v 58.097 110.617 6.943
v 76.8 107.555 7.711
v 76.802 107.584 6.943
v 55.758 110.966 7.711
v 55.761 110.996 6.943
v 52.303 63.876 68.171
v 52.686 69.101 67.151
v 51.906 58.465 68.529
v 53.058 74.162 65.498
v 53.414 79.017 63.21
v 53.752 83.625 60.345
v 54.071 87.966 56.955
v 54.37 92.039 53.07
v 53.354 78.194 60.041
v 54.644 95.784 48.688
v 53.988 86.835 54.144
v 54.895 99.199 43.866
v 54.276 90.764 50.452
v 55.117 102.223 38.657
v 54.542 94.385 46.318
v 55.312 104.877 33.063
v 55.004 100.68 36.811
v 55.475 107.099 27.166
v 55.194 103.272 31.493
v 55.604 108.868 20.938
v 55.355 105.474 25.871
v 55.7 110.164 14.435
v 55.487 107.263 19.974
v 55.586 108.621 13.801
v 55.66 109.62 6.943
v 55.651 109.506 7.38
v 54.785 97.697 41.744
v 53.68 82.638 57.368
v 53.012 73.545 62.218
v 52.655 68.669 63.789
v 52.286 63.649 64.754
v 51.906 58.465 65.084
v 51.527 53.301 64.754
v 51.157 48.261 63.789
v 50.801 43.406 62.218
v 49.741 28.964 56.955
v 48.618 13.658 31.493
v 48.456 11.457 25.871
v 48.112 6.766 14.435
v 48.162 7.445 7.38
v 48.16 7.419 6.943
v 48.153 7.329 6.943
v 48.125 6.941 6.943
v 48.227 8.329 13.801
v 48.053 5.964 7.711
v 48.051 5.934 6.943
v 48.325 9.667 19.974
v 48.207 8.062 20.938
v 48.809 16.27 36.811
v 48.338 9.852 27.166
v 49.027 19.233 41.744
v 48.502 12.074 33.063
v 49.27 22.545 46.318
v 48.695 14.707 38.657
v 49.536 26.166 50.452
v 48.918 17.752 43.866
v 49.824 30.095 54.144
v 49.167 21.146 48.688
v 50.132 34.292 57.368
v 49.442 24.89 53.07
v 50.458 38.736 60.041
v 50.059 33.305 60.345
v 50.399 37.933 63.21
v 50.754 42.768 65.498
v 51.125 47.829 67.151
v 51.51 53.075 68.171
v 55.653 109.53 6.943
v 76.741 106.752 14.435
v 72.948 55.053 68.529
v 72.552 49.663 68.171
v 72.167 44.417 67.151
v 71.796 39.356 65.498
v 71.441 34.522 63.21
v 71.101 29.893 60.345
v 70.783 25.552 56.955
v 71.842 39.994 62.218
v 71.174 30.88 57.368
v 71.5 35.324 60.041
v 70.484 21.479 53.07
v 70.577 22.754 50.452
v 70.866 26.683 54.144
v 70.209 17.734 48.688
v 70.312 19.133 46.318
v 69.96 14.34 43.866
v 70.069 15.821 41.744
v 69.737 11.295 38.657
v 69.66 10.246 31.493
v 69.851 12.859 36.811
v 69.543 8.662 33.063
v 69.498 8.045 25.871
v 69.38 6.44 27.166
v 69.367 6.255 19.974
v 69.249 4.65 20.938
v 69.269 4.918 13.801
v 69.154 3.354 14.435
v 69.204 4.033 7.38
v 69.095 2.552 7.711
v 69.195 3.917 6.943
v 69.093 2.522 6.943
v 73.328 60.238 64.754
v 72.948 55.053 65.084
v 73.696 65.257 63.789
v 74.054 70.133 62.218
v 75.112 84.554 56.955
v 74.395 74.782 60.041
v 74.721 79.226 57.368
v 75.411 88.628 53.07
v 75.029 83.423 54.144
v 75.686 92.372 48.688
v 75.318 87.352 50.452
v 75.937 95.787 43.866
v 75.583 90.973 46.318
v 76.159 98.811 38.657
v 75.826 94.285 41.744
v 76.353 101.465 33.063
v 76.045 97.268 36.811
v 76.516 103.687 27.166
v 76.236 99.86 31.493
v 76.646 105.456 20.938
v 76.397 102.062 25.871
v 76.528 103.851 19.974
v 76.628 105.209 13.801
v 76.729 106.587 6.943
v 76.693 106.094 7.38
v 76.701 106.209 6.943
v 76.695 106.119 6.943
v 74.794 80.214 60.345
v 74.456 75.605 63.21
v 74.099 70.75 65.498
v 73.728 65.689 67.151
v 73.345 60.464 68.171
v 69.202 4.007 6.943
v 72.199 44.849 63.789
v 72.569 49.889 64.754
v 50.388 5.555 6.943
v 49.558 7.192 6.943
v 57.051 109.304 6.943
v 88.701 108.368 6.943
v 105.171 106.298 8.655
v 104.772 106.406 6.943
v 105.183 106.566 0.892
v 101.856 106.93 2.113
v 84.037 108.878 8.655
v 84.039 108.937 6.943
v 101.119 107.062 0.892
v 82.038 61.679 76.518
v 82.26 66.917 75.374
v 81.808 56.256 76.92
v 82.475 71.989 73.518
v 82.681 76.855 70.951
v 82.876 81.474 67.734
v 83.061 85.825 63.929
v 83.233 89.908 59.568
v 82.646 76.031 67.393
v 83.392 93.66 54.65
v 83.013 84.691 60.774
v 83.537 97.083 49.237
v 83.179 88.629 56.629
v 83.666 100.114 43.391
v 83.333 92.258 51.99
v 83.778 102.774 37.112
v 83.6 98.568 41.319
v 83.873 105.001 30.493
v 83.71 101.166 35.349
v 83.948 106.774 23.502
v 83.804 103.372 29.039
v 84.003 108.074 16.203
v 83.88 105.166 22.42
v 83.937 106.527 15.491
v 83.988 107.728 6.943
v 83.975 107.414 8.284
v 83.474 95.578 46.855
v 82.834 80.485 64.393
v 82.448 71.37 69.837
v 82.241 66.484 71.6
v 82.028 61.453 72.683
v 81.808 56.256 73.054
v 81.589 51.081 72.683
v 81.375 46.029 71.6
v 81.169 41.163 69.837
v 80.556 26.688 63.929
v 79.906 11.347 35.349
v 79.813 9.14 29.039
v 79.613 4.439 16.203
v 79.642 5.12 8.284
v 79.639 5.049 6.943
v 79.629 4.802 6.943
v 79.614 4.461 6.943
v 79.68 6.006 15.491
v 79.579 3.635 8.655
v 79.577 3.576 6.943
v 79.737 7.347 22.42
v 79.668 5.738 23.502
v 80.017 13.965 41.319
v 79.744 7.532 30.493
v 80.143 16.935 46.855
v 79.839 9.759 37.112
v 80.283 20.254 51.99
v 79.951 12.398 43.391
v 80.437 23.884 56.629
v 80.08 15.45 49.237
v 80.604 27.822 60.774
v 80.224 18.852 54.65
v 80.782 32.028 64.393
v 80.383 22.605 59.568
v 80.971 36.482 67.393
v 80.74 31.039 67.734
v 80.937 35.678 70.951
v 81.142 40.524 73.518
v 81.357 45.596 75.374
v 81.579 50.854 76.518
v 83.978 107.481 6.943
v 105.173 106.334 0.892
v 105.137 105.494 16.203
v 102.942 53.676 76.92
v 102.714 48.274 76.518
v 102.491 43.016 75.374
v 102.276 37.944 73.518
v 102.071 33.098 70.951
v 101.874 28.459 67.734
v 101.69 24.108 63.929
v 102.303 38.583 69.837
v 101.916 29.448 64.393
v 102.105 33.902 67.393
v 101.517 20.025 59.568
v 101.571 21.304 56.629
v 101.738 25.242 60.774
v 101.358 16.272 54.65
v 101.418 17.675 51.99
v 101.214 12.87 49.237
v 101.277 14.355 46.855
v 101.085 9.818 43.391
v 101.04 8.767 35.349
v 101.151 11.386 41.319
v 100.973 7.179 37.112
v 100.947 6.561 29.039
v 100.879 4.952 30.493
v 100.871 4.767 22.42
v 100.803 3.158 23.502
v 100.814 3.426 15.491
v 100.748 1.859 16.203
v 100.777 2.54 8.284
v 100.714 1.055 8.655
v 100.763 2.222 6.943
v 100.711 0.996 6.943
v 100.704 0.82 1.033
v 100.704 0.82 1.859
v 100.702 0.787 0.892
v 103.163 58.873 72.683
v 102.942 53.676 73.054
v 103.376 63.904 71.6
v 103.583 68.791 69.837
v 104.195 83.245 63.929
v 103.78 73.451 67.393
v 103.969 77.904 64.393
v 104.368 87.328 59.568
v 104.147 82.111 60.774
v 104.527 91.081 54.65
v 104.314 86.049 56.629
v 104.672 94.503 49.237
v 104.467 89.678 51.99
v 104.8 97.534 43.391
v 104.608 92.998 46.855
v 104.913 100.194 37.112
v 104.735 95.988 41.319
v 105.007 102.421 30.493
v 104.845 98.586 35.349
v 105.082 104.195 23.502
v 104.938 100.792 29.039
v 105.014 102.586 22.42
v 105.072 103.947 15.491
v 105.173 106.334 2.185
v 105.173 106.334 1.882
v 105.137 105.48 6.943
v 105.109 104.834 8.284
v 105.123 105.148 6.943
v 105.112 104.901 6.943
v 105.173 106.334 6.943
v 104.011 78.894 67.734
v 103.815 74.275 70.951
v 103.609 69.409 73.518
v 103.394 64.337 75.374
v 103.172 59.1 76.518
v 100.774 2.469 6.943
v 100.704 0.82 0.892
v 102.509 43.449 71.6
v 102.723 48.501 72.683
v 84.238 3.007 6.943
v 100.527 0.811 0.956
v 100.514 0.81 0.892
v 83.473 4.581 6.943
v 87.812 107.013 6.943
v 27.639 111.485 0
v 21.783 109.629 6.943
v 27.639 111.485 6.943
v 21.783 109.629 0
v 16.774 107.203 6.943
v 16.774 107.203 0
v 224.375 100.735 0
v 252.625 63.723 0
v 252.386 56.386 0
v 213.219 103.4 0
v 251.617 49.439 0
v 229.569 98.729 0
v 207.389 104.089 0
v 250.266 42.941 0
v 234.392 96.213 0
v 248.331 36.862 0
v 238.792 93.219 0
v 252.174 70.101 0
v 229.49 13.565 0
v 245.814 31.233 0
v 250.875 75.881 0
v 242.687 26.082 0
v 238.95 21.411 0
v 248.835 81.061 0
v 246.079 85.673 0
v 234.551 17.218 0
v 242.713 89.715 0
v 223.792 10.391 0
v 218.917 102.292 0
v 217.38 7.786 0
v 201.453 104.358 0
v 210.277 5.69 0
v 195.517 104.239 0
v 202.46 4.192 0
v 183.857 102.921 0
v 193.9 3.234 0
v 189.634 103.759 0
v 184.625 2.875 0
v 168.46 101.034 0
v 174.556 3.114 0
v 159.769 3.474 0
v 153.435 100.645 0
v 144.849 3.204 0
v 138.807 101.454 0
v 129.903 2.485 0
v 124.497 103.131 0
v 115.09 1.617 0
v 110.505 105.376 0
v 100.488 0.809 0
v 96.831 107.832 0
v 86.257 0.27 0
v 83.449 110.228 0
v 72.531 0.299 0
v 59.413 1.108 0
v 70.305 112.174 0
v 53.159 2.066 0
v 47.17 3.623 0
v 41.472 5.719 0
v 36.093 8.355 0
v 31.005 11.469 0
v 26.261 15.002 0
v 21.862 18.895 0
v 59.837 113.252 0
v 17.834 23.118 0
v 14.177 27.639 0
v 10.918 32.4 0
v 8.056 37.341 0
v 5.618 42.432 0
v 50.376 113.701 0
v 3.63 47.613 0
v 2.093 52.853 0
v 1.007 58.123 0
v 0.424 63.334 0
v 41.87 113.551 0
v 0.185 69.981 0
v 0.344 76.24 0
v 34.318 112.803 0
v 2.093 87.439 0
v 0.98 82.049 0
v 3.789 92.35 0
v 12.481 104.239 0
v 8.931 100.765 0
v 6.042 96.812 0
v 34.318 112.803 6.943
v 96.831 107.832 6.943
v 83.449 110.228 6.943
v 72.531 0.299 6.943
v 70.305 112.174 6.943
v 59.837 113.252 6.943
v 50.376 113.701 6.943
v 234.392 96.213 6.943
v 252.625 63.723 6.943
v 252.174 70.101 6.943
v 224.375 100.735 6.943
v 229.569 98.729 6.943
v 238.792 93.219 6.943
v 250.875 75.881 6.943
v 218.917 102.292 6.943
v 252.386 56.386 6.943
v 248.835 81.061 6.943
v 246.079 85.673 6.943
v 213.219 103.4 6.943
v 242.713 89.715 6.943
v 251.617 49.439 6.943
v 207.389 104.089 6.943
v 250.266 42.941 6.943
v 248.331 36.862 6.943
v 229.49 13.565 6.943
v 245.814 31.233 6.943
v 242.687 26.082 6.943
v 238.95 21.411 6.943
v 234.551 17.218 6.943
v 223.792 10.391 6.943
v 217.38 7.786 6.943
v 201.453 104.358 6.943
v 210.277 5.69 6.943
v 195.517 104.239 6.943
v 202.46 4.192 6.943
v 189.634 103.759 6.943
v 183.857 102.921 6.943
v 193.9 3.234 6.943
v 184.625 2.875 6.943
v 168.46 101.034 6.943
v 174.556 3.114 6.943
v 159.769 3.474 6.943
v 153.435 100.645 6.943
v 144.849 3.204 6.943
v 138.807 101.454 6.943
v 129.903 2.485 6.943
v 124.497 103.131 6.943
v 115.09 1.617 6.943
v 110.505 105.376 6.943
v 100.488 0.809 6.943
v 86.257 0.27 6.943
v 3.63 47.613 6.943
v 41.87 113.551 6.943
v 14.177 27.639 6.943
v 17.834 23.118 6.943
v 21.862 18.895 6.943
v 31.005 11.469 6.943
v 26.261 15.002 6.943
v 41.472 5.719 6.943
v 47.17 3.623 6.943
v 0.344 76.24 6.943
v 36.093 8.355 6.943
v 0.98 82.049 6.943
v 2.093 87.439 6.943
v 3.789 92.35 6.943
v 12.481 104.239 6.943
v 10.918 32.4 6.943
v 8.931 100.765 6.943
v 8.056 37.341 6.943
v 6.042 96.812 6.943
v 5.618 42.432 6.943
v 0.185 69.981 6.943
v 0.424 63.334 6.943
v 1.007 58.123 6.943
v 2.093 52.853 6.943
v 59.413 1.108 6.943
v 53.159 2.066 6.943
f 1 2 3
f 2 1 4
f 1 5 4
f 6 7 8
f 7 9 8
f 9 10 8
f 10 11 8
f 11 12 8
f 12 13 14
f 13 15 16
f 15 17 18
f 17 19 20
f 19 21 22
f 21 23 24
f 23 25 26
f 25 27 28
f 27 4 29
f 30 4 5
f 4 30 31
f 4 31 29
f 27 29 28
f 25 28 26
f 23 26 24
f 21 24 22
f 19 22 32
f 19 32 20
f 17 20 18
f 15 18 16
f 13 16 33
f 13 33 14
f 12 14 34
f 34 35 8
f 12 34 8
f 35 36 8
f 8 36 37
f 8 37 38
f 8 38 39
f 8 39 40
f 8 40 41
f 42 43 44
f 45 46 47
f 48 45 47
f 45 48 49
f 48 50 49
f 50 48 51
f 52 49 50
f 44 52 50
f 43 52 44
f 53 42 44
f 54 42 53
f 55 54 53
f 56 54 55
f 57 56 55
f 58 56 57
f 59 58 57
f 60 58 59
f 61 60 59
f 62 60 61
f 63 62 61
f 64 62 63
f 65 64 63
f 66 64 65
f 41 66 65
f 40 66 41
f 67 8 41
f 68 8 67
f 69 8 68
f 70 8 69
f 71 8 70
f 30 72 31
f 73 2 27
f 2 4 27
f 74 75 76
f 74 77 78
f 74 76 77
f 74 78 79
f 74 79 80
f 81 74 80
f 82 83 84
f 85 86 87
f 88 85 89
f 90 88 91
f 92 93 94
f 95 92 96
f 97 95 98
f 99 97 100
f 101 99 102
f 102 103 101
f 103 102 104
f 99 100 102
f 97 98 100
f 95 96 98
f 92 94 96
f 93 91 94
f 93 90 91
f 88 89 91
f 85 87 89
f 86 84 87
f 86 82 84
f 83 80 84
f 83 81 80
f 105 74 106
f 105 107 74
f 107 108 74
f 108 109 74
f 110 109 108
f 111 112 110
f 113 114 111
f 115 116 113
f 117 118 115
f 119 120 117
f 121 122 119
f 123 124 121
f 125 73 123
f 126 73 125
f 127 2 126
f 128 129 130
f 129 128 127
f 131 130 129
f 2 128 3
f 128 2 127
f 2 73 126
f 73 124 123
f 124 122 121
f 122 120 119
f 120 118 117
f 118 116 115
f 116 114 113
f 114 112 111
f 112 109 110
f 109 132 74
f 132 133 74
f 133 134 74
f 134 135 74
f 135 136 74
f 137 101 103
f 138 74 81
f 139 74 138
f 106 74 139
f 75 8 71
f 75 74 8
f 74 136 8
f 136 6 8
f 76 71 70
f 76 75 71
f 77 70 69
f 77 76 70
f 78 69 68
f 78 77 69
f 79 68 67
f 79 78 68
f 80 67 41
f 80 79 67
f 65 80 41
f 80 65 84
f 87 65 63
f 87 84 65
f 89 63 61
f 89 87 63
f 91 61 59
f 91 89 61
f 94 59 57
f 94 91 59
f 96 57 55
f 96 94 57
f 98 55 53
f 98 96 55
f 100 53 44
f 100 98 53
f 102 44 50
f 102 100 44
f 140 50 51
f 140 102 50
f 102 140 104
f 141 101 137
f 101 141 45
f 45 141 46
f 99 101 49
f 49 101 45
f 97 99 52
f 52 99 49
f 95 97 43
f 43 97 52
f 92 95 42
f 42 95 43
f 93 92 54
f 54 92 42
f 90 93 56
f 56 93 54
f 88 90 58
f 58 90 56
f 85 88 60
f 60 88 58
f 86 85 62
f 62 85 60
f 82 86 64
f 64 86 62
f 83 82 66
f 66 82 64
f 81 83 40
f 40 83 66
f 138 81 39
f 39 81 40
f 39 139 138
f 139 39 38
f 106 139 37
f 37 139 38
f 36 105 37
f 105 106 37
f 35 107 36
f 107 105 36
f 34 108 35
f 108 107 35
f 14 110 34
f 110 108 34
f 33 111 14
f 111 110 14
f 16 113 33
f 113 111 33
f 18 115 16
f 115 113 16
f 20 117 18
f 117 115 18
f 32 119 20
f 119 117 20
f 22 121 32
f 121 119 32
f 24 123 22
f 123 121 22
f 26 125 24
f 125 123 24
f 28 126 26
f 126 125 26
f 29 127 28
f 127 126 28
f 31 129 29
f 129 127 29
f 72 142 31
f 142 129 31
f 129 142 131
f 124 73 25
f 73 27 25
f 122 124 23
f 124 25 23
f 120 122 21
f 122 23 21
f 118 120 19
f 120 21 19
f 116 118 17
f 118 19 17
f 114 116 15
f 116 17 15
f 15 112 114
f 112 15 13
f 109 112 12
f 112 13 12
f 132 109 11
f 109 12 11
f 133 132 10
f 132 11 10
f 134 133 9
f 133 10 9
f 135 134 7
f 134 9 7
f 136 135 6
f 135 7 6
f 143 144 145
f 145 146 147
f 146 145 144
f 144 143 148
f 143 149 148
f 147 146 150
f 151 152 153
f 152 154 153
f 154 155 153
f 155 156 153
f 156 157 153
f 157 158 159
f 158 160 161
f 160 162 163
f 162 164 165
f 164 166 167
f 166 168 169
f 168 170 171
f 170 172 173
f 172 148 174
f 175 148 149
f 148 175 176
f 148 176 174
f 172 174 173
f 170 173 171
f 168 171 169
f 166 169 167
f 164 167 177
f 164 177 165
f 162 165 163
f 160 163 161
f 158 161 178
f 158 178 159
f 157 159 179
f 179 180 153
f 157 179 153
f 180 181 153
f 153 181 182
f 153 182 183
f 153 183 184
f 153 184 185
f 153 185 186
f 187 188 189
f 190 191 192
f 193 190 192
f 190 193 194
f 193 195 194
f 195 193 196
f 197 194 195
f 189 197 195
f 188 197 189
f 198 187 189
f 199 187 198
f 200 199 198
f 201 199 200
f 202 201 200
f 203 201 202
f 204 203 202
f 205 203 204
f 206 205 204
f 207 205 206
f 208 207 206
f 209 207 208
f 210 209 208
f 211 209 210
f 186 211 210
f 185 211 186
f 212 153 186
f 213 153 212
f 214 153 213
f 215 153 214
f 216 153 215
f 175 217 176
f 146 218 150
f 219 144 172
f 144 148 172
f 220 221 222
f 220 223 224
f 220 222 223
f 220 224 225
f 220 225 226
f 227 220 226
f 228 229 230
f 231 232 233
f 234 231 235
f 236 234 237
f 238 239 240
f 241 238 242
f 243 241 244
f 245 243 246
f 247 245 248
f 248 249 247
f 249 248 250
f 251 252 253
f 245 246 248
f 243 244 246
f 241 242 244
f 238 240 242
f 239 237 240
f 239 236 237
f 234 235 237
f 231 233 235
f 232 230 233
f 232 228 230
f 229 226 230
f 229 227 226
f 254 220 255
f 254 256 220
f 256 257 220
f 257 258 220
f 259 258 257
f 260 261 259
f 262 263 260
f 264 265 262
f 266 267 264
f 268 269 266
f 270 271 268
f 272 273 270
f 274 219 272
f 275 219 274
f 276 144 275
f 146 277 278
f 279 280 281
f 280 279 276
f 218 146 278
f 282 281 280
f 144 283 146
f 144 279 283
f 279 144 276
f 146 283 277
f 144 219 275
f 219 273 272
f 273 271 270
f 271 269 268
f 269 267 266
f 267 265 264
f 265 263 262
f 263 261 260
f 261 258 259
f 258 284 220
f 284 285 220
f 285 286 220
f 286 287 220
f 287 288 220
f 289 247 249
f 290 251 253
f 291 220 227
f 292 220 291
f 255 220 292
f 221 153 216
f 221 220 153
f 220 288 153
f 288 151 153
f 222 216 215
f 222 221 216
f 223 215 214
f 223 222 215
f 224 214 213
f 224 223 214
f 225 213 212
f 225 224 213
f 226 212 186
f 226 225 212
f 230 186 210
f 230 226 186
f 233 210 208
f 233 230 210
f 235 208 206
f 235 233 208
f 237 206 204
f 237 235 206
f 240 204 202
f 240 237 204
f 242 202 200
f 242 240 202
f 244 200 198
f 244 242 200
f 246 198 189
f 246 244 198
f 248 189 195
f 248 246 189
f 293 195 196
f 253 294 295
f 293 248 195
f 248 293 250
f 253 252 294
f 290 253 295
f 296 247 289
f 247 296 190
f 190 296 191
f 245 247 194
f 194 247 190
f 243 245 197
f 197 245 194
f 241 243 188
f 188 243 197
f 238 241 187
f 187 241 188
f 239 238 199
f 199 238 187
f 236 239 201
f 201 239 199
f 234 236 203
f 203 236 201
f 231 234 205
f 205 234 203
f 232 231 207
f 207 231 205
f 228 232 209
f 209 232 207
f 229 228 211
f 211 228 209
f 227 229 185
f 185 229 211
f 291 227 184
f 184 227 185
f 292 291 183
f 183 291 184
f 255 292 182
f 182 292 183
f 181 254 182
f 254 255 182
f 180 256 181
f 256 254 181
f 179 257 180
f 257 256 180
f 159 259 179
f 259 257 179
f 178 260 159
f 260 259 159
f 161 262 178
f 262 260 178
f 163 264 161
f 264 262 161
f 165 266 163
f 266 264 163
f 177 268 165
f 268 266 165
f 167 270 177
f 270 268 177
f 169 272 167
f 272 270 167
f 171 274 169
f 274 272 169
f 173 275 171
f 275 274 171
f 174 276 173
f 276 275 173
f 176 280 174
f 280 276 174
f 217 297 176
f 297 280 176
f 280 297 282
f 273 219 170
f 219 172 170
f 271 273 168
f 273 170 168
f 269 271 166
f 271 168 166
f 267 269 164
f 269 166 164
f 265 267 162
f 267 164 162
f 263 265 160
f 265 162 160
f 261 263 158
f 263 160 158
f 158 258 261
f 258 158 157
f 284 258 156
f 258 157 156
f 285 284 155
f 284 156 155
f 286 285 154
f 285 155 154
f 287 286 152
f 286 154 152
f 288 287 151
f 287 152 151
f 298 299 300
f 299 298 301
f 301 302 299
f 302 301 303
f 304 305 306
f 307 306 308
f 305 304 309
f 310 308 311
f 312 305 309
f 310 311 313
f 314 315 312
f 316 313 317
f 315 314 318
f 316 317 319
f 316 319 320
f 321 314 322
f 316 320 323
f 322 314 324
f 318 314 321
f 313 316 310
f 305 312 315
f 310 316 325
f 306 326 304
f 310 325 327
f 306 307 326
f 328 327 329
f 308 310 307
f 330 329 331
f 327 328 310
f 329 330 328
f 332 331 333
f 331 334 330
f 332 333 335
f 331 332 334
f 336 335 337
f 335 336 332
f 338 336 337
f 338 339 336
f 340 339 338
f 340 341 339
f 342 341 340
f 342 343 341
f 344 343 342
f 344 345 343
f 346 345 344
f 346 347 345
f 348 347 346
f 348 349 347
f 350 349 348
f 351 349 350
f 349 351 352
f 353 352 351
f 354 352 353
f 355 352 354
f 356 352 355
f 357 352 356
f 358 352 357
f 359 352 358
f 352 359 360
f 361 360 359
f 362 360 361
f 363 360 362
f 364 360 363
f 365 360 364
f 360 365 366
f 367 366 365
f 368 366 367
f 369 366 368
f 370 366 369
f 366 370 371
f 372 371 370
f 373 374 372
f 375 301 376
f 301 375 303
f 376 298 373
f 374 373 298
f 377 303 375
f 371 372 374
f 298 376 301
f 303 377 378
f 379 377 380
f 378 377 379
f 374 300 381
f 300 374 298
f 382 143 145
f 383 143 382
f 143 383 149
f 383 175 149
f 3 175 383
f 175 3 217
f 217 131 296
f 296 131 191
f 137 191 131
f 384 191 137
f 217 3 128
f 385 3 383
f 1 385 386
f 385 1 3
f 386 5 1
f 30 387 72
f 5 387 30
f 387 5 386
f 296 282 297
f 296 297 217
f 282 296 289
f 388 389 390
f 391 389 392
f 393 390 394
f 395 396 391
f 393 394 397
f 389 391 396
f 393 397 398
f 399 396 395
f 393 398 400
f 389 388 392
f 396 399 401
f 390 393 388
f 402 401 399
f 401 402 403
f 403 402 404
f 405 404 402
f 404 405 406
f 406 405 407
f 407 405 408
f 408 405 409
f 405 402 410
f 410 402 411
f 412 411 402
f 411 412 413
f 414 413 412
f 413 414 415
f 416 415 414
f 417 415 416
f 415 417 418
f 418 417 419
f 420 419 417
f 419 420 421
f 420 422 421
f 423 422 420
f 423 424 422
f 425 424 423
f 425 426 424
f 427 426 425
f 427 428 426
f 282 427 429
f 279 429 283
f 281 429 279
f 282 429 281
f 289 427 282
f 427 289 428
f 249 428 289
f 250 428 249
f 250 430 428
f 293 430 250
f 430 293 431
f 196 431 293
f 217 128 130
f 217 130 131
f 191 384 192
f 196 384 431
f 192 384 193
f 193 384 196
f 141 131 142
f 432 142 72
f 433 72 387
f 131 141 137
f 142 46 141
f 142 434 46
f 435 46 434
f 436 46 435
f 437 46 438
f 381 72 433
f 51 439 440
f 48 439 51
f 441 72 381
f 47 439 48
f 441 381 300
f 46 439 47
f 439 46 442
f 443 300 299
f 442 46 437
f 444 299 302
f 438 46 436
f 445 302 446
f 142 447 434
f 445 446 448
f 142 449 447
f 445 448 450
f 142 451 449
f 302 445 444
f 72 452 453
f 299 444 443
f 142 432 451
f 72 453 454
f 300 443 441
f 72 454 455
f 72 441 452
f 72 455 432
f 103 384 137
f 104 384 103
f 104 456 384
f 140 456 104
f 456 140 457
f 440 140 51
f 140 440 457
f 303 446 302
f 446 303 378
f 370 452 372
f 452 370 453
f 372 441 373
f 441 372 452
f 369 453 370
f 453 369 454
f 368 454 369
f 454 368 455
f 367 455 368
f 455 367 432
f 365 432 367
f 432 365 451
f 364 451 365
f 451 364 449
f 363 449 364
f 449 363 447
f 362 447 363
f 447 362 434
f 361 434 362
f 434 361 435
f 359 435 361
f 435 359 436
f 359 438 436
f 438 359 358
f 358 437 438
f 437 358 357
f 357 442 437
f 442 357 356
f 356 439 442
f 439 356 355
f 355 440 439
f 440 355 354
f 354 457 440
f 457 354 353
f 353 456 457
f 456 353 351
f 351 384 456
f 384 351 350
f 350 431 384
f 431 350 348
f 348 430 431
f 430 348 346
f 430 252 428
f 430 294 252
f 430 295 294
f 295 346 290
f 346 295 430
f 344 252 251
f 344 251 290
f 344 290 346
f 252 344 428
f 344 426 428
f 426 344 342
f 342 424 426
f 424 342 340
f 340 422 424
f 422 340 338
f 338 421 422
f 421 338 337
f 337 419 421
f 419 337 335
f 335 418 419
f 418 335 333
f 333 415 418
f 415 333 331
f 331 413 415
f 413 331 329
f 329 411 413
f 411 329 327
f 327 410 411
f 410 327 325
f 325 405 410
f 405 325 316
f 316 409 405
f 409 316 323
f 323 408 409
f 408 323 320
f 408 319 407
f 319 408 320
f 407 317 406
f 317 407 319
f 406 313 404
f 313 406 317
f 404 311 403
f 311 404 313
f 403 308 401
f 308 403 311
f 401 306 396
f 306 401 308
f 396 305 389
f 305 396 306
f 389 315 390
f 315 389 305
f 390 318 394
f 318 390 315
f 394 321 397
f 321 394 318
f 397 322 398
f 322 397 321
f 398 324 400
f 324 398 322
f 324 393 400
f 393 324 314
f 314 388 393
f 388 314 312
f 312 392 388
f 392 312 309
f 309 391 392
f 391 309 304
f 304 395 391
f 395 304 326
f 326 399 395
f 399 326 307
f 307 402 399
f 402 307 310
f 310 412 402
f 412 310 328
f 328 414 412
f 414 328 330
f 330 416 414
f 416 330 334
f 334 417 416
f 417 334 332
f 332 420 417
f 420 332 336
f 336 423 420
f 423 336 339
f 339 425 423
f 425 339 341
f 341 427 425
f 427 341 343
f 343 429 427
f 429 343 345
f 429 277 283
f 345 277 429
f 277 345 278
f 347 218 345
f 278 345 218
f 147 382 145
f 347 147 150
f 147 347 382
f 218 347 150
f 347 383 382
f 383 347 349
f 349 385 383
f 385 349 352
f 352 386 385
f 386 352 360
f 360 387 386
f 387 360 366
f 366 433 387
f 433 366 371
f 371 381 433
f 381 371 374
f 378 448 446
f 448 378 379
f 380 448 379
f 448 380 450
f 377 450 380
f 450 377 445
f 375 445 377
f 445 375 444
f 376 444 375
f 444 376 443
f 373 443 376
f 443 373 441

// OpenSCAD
//OPENSTOCK by isaac budmen @ibudmen
// preview[view:south west, tilt:top diagonal]

Which_Foot = "first"; // [first:Left,second:Right]

// 1 wide or 2 thin?
Number_of_Straps = "second"; // [first:Single,second:Double]

sandal_size =  "fifth";// [first:Size 6,second:Size 6.5,third:Size 7,fourth:Size 7.5,fifth:Size 8,sixth:Size 8.5,seventh:Size 9,eigth:Size 9.5,ninth:Size 10,tenth:Size 10.5,eleventh:Size 11,twelveth:Size 11.5]

module print_Number_of_Straps() {
	if (Number_of_Straps == "first") {
		single();
	} else if (Number_of_Straps == "second") {
		double();
	}
}

module sandal(){print_Number_of_Straps(); print_foot();};


print_sandal_size();

module print_sandal_size() {
	if (sandal_size == "first") {
		scale([2.5,2.825,3.275])sandal();
	} else if (sandal_size == "second") {
		scale([2.55,2.8815,3.3405])sandal();
	} else if (sandal_size == "third") {
		scale([2.58,2.9154,3.3798])sandal();
	} else if (sandal_size == "fourth") {
		scale([2.6,2.938,3.406])sandal();
	} else if (sandal_size == "fifth") {
		scale([2.65,2.9945,3.4715])sandal();
	} else if (sandal_size == "sixth") {
		scale([2.7,3.051,3.537])sandal();
	} else if (sandal_size == "seventh") {
		scale([2.75,3.1075,3.6025])sandal();
	} else if (sandal_size == "eighth") {
		scale([2.8,3.164,3.668])sandal();
	} else if (sandal_size == "nineth") {
		scale([2.85,3.2205,3.7335])sandal();
	} else if (sandal_size == "tenth") {
		scale([2.9,3.277,3.799])sandal();
	} else if (sandal_size == "eleventh") {
		scale([2.95,3.3335,3.8645])sandal();
	} else if (sandal_size == "twelveth") {
		scale([3,3.39,3.93])sandal();
	}

}

















module single(){
rotate([0,0,-3]){
translate([14,2.8,0])scale([2.7,1,1])Strap();
}}

module double(){rotate([0,0,-3])translate([18,2.8,0])scale([1,1,0.98])Strap();rotate([0,0,-1])translate([30,1.6,0])scale([1,1,1.1])Strap();}

module print_foot() {
	if (Which_Foot == "first") {
		Base1();
	} else if (Which_Foot == "second") {
		Base2();
	}
}

module Base(){rotate([180,0,-6])translate([0,-40.5,0])Base1();} 

/////////////////////
// MODULE Base1
/////////////////////

// Functions and Utilities
function Base1_dimX() = 95.26;
function Base1_dimY() = 37.88;
function Base1_dimZ() = 2.00;

/////////////////////
// geometry for Base1
function Base1_triangles() = [
[2,1,0],[3,1,2],[5,0,4],[2,0,5],[8,7,6],[9,7,8],[10,9,8],[11,10,8],[12,11,8],[13,12,8],[5,13,8],[2,5,8],[3,2,8],[14,3,8],[15,14,8],[16,15,8],[17,16,8],[18,17,8],[19,18,8],[20,19,8],[21,20,8],[22,21,8],[8,23,22],[8,24,23],[8,25,24],[8,26,25],[8,27,26],[28,27,8],[29,28,8],[30,29,8],[31,30,8],[32,31,8],[33,32,8],[34,33,8],[35,34,8],[36,35,8],[37,36,8],[38,37,8],[39,38,8],[40,39,8],[41,40,8],[42,41,8],[43,42,8],[44,43,8],[45,44,8],[46,45,8],[47,46,8],[48,47,8],[49,48,8],[50,49,8],[51,50,8],[52,51,8],[53,52,8],[54,53,8],[55,54,8],[56,55,8],[57,56,8],[58,57,8],[59,58,8],[60,59,8],[8,61,60],[8,62,61],[63,62,8],[64,63,8],[65,64,8],[66,65,8],[67,66,8],[68,67,8],[69,68,8],[70,69,8],[71,70,8],[72,71,8],[73,72,8],[74,73,8],[75,74,8],[76,75,8],[77,76,8],[78,77,8],[79,78,8],[80,79,8],[81,80,8],[82,81,8],[3,83,1],[14,83,3],[86,85,84],[88,84,87],[86,84,88],[87,84,89],[89,84,90],[90,84,91],[91,84,92],[92,84,93],[93,84,94],[94,84,95],[95,84,96],[96,84,97],[97,84,98],[98,84,99],[99,84,100],[100,84,101],[101,84,102],[102,84,103],[103,84,104],[104,84,105],[105,84,106],[106,84,107],[107,84,108],[108,84,109],[109,84,110],[110,84,111],[111,84,112],[112,84,113],[113,84,114],[114,84,115],[115,84,116],[116,84,117],[117,84,118],[118,84,119],[119,84,120],[120,84,121],[121,84,122],[122,84,123],[123,84,124],[124,84,125],[125,84,126],[126,84,127],[127,84,128],[128,84,129],[129,84,130],[130,84,131],[131,84,132],[132,84,133],[133,84,134],[134,84,135],[135,84,136],[136,84,137],[137,84,138],[138,84,139],[139,84,140],[140,84,141],[141,84,142],[142,84,143],[143,84,144],[144,84,145],[145,84,146],[146,84,147],[147,84,148],[148,84,149],[149,84,150],[150,84,151],[151,84,152],[152,84,83],[83,84,1],[1,84,0],[0,84,4],[4,84,153],[153,84,154],[154,84,155],[155,84,156],[156,84,157],[157,84,158],[158,84,159],[13,4,153],[5,4,13],[8,85,82],[84,85,8],[8,159,84],[6,159,8],[82,86,81],[85,86,82],[81,88,80],[86,88,81],[80,87,79],[88,87,80],[79,89,78],[87,89,79],[78,90,77],[89,90,78],[77,91,76],[90,91,77],[76,92,75],[91,92,76],[75,93,74],[92,93,75],[94,73,74],[94,74,93],[95,72,73],[95,73,94],[96,71,72],[96,72,95],[97,70,71],[97,71,96],[98,69,70],[98,70,97],[99,68,69],[99,69,98],[100,67,68],[100,68,99],[101,66,67],[101,67,100],[102,65,66],[102,66,101],[103,64,65],[103,65,102],[104,63,64],[104,64,103],[105,62,63],[105,63,104],[106,61,62],[106,62,105],[107,60,61],[107,61,106],[108,59,60],[108,60,107],[109,58,59],[109,59,108],[110,57,58],[110,58,109],[111,56,57],[111,57,110],[112,55,56],[112,56,111],[113,54,55],[113,55,112],[114,53,54],[114,54,113],[115,52,53],[115,53,114],[116,51,52],[116,52,115],[117,50,51],[117,51,116],[118,49,50],[118,50,117],[119,48,49],[119,49,118],[120,47,48],[120,48,119],[121,46,47],[121,47,120],[122,45,46],[122,46,121],[123,44,45],[123,45,122],[124,43,44],[124,44,123],[125,42,43],[125,43,124],[125,126,41],[125,41,42],[126,127,40],[126,40,41],[127,128,39],[127,39,40],[128,129,38],[128,38,39],[129,130,37],[129,37,38],[36,130,131],[37,130,36],[35,131,132],[36,131,35],[34,132,133],[35,132,34],[33,133,134],[34,133,33],[32,134,135],[33,134,32],[31,135,136],[32,135,31],[30,136,137],[31,136,30],[29,137,138],[30,137,29],[28,138,139],[29,138,28],[27,139,140],[28,139,27],[26,140,141],[27,140,26],[25,141,142],[26,141,25],[24,142,143],[25,142,24],[23,143,144],[24,143,23],[22,144,145],[23,144,22],[21,145,146],[22,145,21],[20,146,147],[21,146,20],[19,147,148],[20,147,19],[18,148,149],[19,148,18],[17,149,150],[18,149,17],[16,150,151],[17,150,16],[15,151,152],[16,151,15],[14,152,83],[15,152,14],[12,153,154],[13,153,12],[11,154,155],[12,154,11],[10,155,156],[11,155,10],[9,156,157],[10,156,9],[7,157,158],[9,157,7],[6,158,159],[7,158,6]];
function Base1_points() = [
[8.220000,36.610001,2.000000],[10.430000,37.230000,2.000000],[8.220000,36.610001,0.000000],[10.430000,37.230000,0.000000],[6.330000,35.799999,2.000000],[6.330000,35.799999,0.000000],[0.130000,25.459999,0.000000],[0.370000,27.400000,0.000000],[0.070000,23.370001,0.000000],[0.790000,29.200001,0.000000],[1.430000,30.840000,0.000000],[2.280000,32.330002,0.000000],[3.370000,33.650002,0.000000],[4.710000,34.810001,0.000000],[12.950000,37.669998,0.000000],[15.800000,37.919998,0.000000],[19.010000,37.970001,0.000000],[22.580000,37.820000,0.000000],[26.530001,37.459999,0.000000],[31.490000,36.810001,0.000000],[36.540001,36.009998,0.000000],[41.700001,35.189999,0.000000],[46.980000,34.439999,0.000000],[52.380001,33.880001,0.000000],[57.900002,33.610001,0.000000],[63.570000,33.740002,0.000000],[69.379997,34.369999,0.000000],[71.559998,34.650002,0.000000],[73.779999,34.810001,0.000000],[76.019997,34.849998,0.000000],[78.260002,34.759998,0.000000],[80.459999,34.529999,0.000000],[82.610001,34.160000,0.000000],[84.669998,33.639999,0.000000],[86.629997,32.970001,0.000000],[88.449997,32.130001,0.000000],[90.110001,31.129999,0.000000],[91.589996,29.959999,0.000000],[92.860001,28.610001,0.000000],[93.900002,27.070000,0.000000],[94.669998,25.340000,0.000000],[95.160004,23.410000,0.000000],[95.330002,21.280001,0.000000],[95.239998,18.830000,0.000000],[94.949997,16.510000,0.000000],[94.440002,14.340000,0.000000],[93.709999,12.310000,0.000000],[92.760002,10.430000,0.000000],[91.580002,8.710000,0.000000],[90.169998,7.150000,0.000000],[88.510002,5.750000,0.000000],[86.599998,4.530000,0.000000],[84.449997,3.470000,0.000000],[82.029999,2.600000,0.000000],[79.349998,1.900000,0.000000],[76.400002,1.400000,0.000000],[73.169998,1.080000,0.000000],[69.669998,0.960000,0.000000],[65.870003,1.040000,0.000000],[60.290001,1.160000,0.000000],[54.660000,1.070000,0.000000],[49.020000,0.830000,0.000000],[43.430000,0.540000,0.000000],[37.919998,0.270000,0.000000],[32.549999,0.090000,0.000000],[27.370001,0.100000,0.000000],[22.420000,0.370000,0.000000],[20.059999,0.690000,0.000000],[17.799999,1.210000,0.000000],[15.650000,1.910000,0.000000],[13.620000,2.790000,0.000000],[11.700000,3.830000,0.000000],[9.910000,5.010000,0.000000],[8.250000,6.310000,0.000000],[6.730000,7.720000,0.000000],[5.350000,9.230000,0.000000],[4.120000,10.820000,0.000000],[3.040000,12.470000,0.000000],[2.120000,14.170000,0.000000],[1.370000,15.900000,0.000000],[0.790000,17.650000,0.000000],[0.380000,19.410000,0.000000],[0.160000,21.150000,0.000000],[12.950000,37.669998,2.000000],[0.070000,23.370001,2.000000],[0.160000,21.150000,2.000000],[0.380000,19.410000,2.000000],[1.370000,15.900000,2.000000],[0.790000,17.650000,2.000000],[2.120000,14.170000,2.000000],[3.040000,12.470000,2.000000],[4.120000,10.820000,2.000000],[5.350000,9.230000,2.000000],[6.730000,7.720000,2.000000],[8.250000,6.310000,2.000000],[9.910000,5.010000,2.000000],[11.700000,3.830000,2.000000],[13.620000,2.790000,2.000000],[15.650000,1.910000,2.000000],[17.799999,1.210000,2.000000],[20.059999,0.690000,2.000000],[22.420000,0.370000,2.000000],[27.370001,0.100000,2.000000],[32.549999,0.090000,2.000000],[37.919998,0.270000,2.000000],[43.430000,0.540000,2.000000],[49.020000,0.830000,2.000000],[54.660000,1.070000,2.000000],[60.290001,1.160000,2.000000],[65.870003,1.040000,2.000000],[69.669998,0.960000,2.000000],[73.169998,1.080000,2.000000],[76.400002,1.400000,2.000000],[79.349998,1.900000,2.000000],[82.029999,2.600000,2.000000],[84.449997,3.470000,2.000000],[86.599998,4.530000,2.000000],[88.510002,5.750000,2.000000],[90.169998,7.150000,2.000000],[91.580002,8.710000,2.000000],[92.760002,10.430000,2.000000],[93.709999,12.310000,2.000000],[94.440002,14.340000,2.000000],[94.949997,16.510000,2.000000],[95.239998,18.830000,2.000000],[95.330002,21.280001,2.000000],[95.160004,23.410000,2.000000],[94.669998,25.340000,2.000000],[93.900002,27.070000,2.000000],[92.860001,28.610001,2.000000],[91.589996,29.959999,2.000000],[90.110001,31.129999,2.000000],[88.449997,32.130001,2.000000],[86.629997,32.970001,2.000000],[84.669998,33.639999,2.000000],[82.610001,34.160000,2.000000],[80.459999,34.529999,2.000000],[78.260002,34.759998,2.000000],[76.019997,34.849998,2.000000],[73.779999,34.810001,2.000000],[71.559998,34.650002,2.000000],[69.379997,34.369999,2.000000],[63.570000,33.740002,2.000000],[57.900002,33.610001,2.000000],[52.380001,33.880001,2.000000],[46.980000,34.439999,2.000000],[41.700001,35.189999,2.000000],[36.540001,36.009998,2.000000],[31.490000,36.810001,2.000000],[26.530001,37.459999,2.000000],[22.580000,37.820000,2.000000],[19.010000,37.970001,2.000000],[15.800000,37.919998,2.000000],[4.710000,34.810001,2.000000],[3.370000,33.650002,2.000000],[2.280000,32.330002,2.000000],[1.430000,30.840000,2.000000],[0.790000,29.200001,2.000000],[0.370000,27.400000,2.000000],[0.130000,25.459999,2.000000]];module Base1() {
  polyhedron(triangles = Base1_triangles(), points = Base1_points(), convexity=10);
};

/////////////////////
// MODULE Strap
/////////////////////

// Functions and Utilities
function Strap_dimX() = 9.06;
function Strap_dimY() = 36.07;
function Strap_dimZ() = 19.91;

/////////////////////
// geometry for Strap
function Strap_triangles() = [
[2,1,0],[3,1,2],[6,5,4],[7,5,6],[8,7,6],[9,8,6],[10,9,6],[12,10,11],[14,12,13],[16,14,15],[18,16,17],[20,18,19],[22,20,21],[24,22,23],[26,24,25],[2,26,27],[3,2,28],[28,2,27],[27,26,25],[25,24,23],[23,22,21],[21,20,19],[19,18,29],[29,18,17],[17,16,15],[15,14,13],[13,12,30],[30,12,11],[11,10,31],[31,6,32],[31,10,6],[32,6,33],[33,6,34],[35,34,6],[6,36,35],[6,37,36],[6,38,37],[41,40,39],[44,43,42],[45,44,42],[46,44,45],[47,46,45],[40,46,47],[39,40,47],[48,40,41],[49,48,41],[50,48,49],[51,50,49],[52,50,51],[53,52,51],[54,52,53],[55,54,53],[56,54,55],[57,56,55],[58,56,57],[59,58,57],[60,58,59],[61,60,59],[38,60,61],[37,38,61],[62,38,6],[63,62,6],[64,63,6],[65,64,6],[66,65,6],[67,3,28],[67,1,3],[68,1,67],[26,0,69],[2,0,26],[72,71,70],[74,70,73],[72,70,74],[73,70,75],[75,70,76],[76,70,77],[80,79,78],[83,82,81],[85,81,84],[87,84,86],[90,89,88],[92,88,91],[94,91,93],[96,93,95],[98,95,97],[98,97,99],[96,95,98],[94,93,96],[92,91,94],[90,88,92],[87,89,90],[87,86,89],[85,84,87],[83,81,85],[80,82,83],[80,78,82],[76,79,80],[76,77,79],[101,70,100],[100,70,102],[102,70,103],[103,70,104],[105,103,104],[107,105,106],[109,107,108],[111,109,110],[113,111,112],[115,113,114],[117,115,116],[119,117,118],[120,119,69],[121,120,69],[122,121,0],[123,122,1],[68,123,1],[1,122,0],[0,121,69],[69,119,118],[118,117,116],[116,115,114],[114,113,112],[112,111,110],[110,109,108],[108,107,106],[106,105,104],[104,70,124],[124,70,125],[125,70,126],[126,70,127],[127,70,128],[99,97,129],[70,130,77],[70,131,130],[70,101,131],[71,66,6],[71,6,70],[128,70,6],[128,6,4],[72,65,66],[72,66,71],[74,64,65],[74,65,72],[73,63,64],[73,64,74],[75,62,63],[75,63,73],[76,38,62],[76,62,75],[80,60,38],[80,38,76],[83,58,60],[83,60,80],[85,56,58],[85,58,83],[87,54,56],[87,56,85],[90,52,54],[90,54,87],[92,50,52],[92,52,90],[94,48,50],[94,50,92],[96,40,48],[96,48,94],[98,46,40],[98,40,96],[99,44,46],[99,46,98],[44,129,43],[99,129,44],[42,129,97],[43,129,42],[45,97,95],[42,97,45],[47,95,93],[45,95,47],[39,93,91],[47,93,39],[41,91,88],[39,91,41],[49,88,89],[41,88,49],[51,89,86],[49,89,51],[53,86,84],[51,86,53],[55,84,81],[53,84,55],[57,81,82],[55,81,57],[59,82,78],[57,82,59],[61,78,79],[59,78,61],[37,79,77],[61,79,37],[36,77,130],[37,77,36],[35,130,131],[36,130,35],[34,131,101],[35,131,34],[34,100,33],[101,100,34],[33,102,32],[100,102,33],[32,103,31],[102,103,32],[31,105,11],[103,105,31],[11,107,30],[105,107,11],[30,109,13],[107,109,30],[13,111,15],[109,111,13],[15,113,17],[111,113,15],[115,29,17],[115,17,113],[117,19,29],[117,29,115],[119,21,19],[119,19,117],[120,23,21],[120,21,119],[121,25,23],[121,23,120],[122,27,25],[122,25,121],[123,28,27],[123,27,122],[68,67,28],[68,28,123],[24,69,118],[26,69,24],[22,118,116],[24,118,22],[20,116,114],[22,116,20],[18,114,112],[20,114,18],[16,112,110],[18,112,16],[14,110,108],[16,110,14],[12,108,106],[14,108,12],[106,104,10],[106,10,12],[104,124,9],[104,9,10],[124,125,8],[124,8,9],[125,126,7],[125,7,8],[126,127,5],[126,5,7],[127,128,4],[127,4,5]];
function Strap_points() = [
[9.061710,34.584900,2.266600],[9.064440,34.674500,0.233500],[1.072680,35.307098,2.266600],[1.075400,35.396702,0.233500],[0.593490,19.534700,20.038000],[0.646663,21.284901,19.738300],[0.538432,17.722500,20.143299],[0.698162,22.980000,19.252300],[0.747567,24.606100,18.580000],[0.794460,26.149599,17.737600],[0.838631,27.603500,16.741301],[0.739193,24.330500,17.648500],[0.880081,28.967800,15.599200],[0.827117,27.224501,15.915100],[0.918182,30.221901,14.311300],[0.867102,28.540600,14.829700],[0.952933,31.365801,12.893800],[0.903947,29.753401,13.614700],[0.983707,32.378700,11.362900],[0.968006,31.861900,10.820200],[1.010710,33.267502,9.718600],[0.994383,32.730099,9.256900],[1.033320,34.011700,7.985200],[1.016780,33.467400,7.604500],[1.051320,34.604301,6.154600],[1.035000,34.066799,5.871100],[1.064510,35.038399,4.243000],[1.048810,34.521599,4.056700],[1.057810,34.817902,2.169400],[0.937651,30.862700,12.270100],[0.784411,25.818899,16.862801],[0.691881,22.773199,18.288401],[0.642267,21.140200,18.750099],[0.591187,19.458900,19.033600],[0.538432,17.722500,19.130800],[0.485887,15.993000,19.033600],[0.434598,14.304800,18.750099],[0.385193,12.678600,18.288401],[0.238233,7.841440,16.741301],[0.060082,1.977590,7.604500],[0.012351,0.406542,4.243000],[0.082482,2.714870,9.256900],[0.019260,0.633930,2.169400],[0.015282,0.503010,0.233500],[0.001465,0.048234,0.233500],[0.028261,0.930223,4.056700],[0.004187,0.137811,2.266600],[0.041869,1.378110,5.871100],[0.025540,0.840646,6.154600],[0.109068,3.589970,10.820200],[0.043753,1.440120,7.985200],[0.139214,4.582210,12.270100],[0.066362,2.184300,9.718600],[0.172918,5.691590,13.614700],[0.093158,3.066290,11.362900],[0.209763,6.904320,14.829700],[0.124141,4.086090,12.893800],[0.249747,8.220420,15.915100],[0.158683,5.223030,14.311300],[0.292453,9.626090,16.862801],[0.196783,6.477110,15.599200],[0.337672,11.114400,17.648500],[0.282405,9.295340,17.737600],[0.329507,10.845700,18.580000],[0.378703,12.465000,19.252300],[0.430202,14.160100,19.738300],[0.483584,15.917200,20.038000],[1.061580,34.941898,0.233500],[9.050620,34.219700,0.233500],[9.053550,34.316200,4.243000],[8.527470,17.000200,20.143299],[8.472620,15.194900,20.038000],[8.419240,13.437800,19.738300],[8.318540,10.123500,18.580000],[8.367740,11.742800,19.252300],[8.271440,8.573110,17.737600],[8.227270,7.119200,16.741301],[8.374230,11.956400,18.288401],[8.281490,8.903850,16.862801],[8.326710,10.392200,17.648500],[8.185820,5.754870,15.599200],[8.198800,6.182090,14.829700],[8.238780,7.498180,15.915100],[8.147720,4.500800,14.311300],[8.161950,4.969350,13.614700],[8.113180,3.363860,12.893800],[8.128250,3.859980,12.270100],[8.082190,2.344060,11.362900],[8.071520,1.992640,9.256900],[8.098100,2.867740,10.820200],[8.055400,1.462070,9.718600],[8.049120,1.255350,7.604500],[8.032790,0.717887,7.985200],[8.030910,0.655873,5.871100],[8.014580,0.118410,6.154600],[8.017300,0.207987,4.056700],[8.001390,-0.315694,4.243000],[8.008300,-0.088306,2.169400],[7.993220,-0.584425,2.266600],[7.990500,-0.674002,0.233500],[8.580220,18.736700,19.033600],[8.527470,17.000200,19.130800],[8.631300,20.417999,18.750099],[8.680920,22.051001,18.288401],[8.827670,26.881300,16.741301],[8.728230,23.608299,17.648500],[8.869120,28.245600,15.599200],[8.773450,25.096600,16.862801],[8.907220,29.499701,14.311300],[8.816150,26.502300,15.915100],[8.941970,30.643499,12.893800],[8.856140,27.818399,14.829700],[8.972740,31.656401,11.362900],[8.892980,29.031099,13.614700],[8.999750,32.545300,9.718600],[8.926690,30.140499,12.270100],[9.022360,33.289501,7.985200],[8.957040,31.139601,10.820200],[9.040360,33.882099,6.154600],[8.983420,32.007801,9.256900],[9.005820,32.745098,7.604500],[9.024030,33.344601,5.871100],[9.037850,33.799400,4.056700],[9.046850,34.095699,2.169400],[8.783500,25.427401,17.737600],[8.736600,23.883900,18.580000],[8.687200,22.257700,19.252300],[8.635700,20.562700,19.738300],[8.582530,18.812500,20.038000],[8.004320,-0.219226,0.233500],[8.423630,13.582500,18.750099],[8.474920,15.270700,19.033600]];module Strap() {
  polyhedron(triangles = Strap_triangles(), points = Strap_points(), convexity=10);
};

////

module Base2(){rotate([180,0,-6])translate([0,-40.5,0])Base1();}; 
